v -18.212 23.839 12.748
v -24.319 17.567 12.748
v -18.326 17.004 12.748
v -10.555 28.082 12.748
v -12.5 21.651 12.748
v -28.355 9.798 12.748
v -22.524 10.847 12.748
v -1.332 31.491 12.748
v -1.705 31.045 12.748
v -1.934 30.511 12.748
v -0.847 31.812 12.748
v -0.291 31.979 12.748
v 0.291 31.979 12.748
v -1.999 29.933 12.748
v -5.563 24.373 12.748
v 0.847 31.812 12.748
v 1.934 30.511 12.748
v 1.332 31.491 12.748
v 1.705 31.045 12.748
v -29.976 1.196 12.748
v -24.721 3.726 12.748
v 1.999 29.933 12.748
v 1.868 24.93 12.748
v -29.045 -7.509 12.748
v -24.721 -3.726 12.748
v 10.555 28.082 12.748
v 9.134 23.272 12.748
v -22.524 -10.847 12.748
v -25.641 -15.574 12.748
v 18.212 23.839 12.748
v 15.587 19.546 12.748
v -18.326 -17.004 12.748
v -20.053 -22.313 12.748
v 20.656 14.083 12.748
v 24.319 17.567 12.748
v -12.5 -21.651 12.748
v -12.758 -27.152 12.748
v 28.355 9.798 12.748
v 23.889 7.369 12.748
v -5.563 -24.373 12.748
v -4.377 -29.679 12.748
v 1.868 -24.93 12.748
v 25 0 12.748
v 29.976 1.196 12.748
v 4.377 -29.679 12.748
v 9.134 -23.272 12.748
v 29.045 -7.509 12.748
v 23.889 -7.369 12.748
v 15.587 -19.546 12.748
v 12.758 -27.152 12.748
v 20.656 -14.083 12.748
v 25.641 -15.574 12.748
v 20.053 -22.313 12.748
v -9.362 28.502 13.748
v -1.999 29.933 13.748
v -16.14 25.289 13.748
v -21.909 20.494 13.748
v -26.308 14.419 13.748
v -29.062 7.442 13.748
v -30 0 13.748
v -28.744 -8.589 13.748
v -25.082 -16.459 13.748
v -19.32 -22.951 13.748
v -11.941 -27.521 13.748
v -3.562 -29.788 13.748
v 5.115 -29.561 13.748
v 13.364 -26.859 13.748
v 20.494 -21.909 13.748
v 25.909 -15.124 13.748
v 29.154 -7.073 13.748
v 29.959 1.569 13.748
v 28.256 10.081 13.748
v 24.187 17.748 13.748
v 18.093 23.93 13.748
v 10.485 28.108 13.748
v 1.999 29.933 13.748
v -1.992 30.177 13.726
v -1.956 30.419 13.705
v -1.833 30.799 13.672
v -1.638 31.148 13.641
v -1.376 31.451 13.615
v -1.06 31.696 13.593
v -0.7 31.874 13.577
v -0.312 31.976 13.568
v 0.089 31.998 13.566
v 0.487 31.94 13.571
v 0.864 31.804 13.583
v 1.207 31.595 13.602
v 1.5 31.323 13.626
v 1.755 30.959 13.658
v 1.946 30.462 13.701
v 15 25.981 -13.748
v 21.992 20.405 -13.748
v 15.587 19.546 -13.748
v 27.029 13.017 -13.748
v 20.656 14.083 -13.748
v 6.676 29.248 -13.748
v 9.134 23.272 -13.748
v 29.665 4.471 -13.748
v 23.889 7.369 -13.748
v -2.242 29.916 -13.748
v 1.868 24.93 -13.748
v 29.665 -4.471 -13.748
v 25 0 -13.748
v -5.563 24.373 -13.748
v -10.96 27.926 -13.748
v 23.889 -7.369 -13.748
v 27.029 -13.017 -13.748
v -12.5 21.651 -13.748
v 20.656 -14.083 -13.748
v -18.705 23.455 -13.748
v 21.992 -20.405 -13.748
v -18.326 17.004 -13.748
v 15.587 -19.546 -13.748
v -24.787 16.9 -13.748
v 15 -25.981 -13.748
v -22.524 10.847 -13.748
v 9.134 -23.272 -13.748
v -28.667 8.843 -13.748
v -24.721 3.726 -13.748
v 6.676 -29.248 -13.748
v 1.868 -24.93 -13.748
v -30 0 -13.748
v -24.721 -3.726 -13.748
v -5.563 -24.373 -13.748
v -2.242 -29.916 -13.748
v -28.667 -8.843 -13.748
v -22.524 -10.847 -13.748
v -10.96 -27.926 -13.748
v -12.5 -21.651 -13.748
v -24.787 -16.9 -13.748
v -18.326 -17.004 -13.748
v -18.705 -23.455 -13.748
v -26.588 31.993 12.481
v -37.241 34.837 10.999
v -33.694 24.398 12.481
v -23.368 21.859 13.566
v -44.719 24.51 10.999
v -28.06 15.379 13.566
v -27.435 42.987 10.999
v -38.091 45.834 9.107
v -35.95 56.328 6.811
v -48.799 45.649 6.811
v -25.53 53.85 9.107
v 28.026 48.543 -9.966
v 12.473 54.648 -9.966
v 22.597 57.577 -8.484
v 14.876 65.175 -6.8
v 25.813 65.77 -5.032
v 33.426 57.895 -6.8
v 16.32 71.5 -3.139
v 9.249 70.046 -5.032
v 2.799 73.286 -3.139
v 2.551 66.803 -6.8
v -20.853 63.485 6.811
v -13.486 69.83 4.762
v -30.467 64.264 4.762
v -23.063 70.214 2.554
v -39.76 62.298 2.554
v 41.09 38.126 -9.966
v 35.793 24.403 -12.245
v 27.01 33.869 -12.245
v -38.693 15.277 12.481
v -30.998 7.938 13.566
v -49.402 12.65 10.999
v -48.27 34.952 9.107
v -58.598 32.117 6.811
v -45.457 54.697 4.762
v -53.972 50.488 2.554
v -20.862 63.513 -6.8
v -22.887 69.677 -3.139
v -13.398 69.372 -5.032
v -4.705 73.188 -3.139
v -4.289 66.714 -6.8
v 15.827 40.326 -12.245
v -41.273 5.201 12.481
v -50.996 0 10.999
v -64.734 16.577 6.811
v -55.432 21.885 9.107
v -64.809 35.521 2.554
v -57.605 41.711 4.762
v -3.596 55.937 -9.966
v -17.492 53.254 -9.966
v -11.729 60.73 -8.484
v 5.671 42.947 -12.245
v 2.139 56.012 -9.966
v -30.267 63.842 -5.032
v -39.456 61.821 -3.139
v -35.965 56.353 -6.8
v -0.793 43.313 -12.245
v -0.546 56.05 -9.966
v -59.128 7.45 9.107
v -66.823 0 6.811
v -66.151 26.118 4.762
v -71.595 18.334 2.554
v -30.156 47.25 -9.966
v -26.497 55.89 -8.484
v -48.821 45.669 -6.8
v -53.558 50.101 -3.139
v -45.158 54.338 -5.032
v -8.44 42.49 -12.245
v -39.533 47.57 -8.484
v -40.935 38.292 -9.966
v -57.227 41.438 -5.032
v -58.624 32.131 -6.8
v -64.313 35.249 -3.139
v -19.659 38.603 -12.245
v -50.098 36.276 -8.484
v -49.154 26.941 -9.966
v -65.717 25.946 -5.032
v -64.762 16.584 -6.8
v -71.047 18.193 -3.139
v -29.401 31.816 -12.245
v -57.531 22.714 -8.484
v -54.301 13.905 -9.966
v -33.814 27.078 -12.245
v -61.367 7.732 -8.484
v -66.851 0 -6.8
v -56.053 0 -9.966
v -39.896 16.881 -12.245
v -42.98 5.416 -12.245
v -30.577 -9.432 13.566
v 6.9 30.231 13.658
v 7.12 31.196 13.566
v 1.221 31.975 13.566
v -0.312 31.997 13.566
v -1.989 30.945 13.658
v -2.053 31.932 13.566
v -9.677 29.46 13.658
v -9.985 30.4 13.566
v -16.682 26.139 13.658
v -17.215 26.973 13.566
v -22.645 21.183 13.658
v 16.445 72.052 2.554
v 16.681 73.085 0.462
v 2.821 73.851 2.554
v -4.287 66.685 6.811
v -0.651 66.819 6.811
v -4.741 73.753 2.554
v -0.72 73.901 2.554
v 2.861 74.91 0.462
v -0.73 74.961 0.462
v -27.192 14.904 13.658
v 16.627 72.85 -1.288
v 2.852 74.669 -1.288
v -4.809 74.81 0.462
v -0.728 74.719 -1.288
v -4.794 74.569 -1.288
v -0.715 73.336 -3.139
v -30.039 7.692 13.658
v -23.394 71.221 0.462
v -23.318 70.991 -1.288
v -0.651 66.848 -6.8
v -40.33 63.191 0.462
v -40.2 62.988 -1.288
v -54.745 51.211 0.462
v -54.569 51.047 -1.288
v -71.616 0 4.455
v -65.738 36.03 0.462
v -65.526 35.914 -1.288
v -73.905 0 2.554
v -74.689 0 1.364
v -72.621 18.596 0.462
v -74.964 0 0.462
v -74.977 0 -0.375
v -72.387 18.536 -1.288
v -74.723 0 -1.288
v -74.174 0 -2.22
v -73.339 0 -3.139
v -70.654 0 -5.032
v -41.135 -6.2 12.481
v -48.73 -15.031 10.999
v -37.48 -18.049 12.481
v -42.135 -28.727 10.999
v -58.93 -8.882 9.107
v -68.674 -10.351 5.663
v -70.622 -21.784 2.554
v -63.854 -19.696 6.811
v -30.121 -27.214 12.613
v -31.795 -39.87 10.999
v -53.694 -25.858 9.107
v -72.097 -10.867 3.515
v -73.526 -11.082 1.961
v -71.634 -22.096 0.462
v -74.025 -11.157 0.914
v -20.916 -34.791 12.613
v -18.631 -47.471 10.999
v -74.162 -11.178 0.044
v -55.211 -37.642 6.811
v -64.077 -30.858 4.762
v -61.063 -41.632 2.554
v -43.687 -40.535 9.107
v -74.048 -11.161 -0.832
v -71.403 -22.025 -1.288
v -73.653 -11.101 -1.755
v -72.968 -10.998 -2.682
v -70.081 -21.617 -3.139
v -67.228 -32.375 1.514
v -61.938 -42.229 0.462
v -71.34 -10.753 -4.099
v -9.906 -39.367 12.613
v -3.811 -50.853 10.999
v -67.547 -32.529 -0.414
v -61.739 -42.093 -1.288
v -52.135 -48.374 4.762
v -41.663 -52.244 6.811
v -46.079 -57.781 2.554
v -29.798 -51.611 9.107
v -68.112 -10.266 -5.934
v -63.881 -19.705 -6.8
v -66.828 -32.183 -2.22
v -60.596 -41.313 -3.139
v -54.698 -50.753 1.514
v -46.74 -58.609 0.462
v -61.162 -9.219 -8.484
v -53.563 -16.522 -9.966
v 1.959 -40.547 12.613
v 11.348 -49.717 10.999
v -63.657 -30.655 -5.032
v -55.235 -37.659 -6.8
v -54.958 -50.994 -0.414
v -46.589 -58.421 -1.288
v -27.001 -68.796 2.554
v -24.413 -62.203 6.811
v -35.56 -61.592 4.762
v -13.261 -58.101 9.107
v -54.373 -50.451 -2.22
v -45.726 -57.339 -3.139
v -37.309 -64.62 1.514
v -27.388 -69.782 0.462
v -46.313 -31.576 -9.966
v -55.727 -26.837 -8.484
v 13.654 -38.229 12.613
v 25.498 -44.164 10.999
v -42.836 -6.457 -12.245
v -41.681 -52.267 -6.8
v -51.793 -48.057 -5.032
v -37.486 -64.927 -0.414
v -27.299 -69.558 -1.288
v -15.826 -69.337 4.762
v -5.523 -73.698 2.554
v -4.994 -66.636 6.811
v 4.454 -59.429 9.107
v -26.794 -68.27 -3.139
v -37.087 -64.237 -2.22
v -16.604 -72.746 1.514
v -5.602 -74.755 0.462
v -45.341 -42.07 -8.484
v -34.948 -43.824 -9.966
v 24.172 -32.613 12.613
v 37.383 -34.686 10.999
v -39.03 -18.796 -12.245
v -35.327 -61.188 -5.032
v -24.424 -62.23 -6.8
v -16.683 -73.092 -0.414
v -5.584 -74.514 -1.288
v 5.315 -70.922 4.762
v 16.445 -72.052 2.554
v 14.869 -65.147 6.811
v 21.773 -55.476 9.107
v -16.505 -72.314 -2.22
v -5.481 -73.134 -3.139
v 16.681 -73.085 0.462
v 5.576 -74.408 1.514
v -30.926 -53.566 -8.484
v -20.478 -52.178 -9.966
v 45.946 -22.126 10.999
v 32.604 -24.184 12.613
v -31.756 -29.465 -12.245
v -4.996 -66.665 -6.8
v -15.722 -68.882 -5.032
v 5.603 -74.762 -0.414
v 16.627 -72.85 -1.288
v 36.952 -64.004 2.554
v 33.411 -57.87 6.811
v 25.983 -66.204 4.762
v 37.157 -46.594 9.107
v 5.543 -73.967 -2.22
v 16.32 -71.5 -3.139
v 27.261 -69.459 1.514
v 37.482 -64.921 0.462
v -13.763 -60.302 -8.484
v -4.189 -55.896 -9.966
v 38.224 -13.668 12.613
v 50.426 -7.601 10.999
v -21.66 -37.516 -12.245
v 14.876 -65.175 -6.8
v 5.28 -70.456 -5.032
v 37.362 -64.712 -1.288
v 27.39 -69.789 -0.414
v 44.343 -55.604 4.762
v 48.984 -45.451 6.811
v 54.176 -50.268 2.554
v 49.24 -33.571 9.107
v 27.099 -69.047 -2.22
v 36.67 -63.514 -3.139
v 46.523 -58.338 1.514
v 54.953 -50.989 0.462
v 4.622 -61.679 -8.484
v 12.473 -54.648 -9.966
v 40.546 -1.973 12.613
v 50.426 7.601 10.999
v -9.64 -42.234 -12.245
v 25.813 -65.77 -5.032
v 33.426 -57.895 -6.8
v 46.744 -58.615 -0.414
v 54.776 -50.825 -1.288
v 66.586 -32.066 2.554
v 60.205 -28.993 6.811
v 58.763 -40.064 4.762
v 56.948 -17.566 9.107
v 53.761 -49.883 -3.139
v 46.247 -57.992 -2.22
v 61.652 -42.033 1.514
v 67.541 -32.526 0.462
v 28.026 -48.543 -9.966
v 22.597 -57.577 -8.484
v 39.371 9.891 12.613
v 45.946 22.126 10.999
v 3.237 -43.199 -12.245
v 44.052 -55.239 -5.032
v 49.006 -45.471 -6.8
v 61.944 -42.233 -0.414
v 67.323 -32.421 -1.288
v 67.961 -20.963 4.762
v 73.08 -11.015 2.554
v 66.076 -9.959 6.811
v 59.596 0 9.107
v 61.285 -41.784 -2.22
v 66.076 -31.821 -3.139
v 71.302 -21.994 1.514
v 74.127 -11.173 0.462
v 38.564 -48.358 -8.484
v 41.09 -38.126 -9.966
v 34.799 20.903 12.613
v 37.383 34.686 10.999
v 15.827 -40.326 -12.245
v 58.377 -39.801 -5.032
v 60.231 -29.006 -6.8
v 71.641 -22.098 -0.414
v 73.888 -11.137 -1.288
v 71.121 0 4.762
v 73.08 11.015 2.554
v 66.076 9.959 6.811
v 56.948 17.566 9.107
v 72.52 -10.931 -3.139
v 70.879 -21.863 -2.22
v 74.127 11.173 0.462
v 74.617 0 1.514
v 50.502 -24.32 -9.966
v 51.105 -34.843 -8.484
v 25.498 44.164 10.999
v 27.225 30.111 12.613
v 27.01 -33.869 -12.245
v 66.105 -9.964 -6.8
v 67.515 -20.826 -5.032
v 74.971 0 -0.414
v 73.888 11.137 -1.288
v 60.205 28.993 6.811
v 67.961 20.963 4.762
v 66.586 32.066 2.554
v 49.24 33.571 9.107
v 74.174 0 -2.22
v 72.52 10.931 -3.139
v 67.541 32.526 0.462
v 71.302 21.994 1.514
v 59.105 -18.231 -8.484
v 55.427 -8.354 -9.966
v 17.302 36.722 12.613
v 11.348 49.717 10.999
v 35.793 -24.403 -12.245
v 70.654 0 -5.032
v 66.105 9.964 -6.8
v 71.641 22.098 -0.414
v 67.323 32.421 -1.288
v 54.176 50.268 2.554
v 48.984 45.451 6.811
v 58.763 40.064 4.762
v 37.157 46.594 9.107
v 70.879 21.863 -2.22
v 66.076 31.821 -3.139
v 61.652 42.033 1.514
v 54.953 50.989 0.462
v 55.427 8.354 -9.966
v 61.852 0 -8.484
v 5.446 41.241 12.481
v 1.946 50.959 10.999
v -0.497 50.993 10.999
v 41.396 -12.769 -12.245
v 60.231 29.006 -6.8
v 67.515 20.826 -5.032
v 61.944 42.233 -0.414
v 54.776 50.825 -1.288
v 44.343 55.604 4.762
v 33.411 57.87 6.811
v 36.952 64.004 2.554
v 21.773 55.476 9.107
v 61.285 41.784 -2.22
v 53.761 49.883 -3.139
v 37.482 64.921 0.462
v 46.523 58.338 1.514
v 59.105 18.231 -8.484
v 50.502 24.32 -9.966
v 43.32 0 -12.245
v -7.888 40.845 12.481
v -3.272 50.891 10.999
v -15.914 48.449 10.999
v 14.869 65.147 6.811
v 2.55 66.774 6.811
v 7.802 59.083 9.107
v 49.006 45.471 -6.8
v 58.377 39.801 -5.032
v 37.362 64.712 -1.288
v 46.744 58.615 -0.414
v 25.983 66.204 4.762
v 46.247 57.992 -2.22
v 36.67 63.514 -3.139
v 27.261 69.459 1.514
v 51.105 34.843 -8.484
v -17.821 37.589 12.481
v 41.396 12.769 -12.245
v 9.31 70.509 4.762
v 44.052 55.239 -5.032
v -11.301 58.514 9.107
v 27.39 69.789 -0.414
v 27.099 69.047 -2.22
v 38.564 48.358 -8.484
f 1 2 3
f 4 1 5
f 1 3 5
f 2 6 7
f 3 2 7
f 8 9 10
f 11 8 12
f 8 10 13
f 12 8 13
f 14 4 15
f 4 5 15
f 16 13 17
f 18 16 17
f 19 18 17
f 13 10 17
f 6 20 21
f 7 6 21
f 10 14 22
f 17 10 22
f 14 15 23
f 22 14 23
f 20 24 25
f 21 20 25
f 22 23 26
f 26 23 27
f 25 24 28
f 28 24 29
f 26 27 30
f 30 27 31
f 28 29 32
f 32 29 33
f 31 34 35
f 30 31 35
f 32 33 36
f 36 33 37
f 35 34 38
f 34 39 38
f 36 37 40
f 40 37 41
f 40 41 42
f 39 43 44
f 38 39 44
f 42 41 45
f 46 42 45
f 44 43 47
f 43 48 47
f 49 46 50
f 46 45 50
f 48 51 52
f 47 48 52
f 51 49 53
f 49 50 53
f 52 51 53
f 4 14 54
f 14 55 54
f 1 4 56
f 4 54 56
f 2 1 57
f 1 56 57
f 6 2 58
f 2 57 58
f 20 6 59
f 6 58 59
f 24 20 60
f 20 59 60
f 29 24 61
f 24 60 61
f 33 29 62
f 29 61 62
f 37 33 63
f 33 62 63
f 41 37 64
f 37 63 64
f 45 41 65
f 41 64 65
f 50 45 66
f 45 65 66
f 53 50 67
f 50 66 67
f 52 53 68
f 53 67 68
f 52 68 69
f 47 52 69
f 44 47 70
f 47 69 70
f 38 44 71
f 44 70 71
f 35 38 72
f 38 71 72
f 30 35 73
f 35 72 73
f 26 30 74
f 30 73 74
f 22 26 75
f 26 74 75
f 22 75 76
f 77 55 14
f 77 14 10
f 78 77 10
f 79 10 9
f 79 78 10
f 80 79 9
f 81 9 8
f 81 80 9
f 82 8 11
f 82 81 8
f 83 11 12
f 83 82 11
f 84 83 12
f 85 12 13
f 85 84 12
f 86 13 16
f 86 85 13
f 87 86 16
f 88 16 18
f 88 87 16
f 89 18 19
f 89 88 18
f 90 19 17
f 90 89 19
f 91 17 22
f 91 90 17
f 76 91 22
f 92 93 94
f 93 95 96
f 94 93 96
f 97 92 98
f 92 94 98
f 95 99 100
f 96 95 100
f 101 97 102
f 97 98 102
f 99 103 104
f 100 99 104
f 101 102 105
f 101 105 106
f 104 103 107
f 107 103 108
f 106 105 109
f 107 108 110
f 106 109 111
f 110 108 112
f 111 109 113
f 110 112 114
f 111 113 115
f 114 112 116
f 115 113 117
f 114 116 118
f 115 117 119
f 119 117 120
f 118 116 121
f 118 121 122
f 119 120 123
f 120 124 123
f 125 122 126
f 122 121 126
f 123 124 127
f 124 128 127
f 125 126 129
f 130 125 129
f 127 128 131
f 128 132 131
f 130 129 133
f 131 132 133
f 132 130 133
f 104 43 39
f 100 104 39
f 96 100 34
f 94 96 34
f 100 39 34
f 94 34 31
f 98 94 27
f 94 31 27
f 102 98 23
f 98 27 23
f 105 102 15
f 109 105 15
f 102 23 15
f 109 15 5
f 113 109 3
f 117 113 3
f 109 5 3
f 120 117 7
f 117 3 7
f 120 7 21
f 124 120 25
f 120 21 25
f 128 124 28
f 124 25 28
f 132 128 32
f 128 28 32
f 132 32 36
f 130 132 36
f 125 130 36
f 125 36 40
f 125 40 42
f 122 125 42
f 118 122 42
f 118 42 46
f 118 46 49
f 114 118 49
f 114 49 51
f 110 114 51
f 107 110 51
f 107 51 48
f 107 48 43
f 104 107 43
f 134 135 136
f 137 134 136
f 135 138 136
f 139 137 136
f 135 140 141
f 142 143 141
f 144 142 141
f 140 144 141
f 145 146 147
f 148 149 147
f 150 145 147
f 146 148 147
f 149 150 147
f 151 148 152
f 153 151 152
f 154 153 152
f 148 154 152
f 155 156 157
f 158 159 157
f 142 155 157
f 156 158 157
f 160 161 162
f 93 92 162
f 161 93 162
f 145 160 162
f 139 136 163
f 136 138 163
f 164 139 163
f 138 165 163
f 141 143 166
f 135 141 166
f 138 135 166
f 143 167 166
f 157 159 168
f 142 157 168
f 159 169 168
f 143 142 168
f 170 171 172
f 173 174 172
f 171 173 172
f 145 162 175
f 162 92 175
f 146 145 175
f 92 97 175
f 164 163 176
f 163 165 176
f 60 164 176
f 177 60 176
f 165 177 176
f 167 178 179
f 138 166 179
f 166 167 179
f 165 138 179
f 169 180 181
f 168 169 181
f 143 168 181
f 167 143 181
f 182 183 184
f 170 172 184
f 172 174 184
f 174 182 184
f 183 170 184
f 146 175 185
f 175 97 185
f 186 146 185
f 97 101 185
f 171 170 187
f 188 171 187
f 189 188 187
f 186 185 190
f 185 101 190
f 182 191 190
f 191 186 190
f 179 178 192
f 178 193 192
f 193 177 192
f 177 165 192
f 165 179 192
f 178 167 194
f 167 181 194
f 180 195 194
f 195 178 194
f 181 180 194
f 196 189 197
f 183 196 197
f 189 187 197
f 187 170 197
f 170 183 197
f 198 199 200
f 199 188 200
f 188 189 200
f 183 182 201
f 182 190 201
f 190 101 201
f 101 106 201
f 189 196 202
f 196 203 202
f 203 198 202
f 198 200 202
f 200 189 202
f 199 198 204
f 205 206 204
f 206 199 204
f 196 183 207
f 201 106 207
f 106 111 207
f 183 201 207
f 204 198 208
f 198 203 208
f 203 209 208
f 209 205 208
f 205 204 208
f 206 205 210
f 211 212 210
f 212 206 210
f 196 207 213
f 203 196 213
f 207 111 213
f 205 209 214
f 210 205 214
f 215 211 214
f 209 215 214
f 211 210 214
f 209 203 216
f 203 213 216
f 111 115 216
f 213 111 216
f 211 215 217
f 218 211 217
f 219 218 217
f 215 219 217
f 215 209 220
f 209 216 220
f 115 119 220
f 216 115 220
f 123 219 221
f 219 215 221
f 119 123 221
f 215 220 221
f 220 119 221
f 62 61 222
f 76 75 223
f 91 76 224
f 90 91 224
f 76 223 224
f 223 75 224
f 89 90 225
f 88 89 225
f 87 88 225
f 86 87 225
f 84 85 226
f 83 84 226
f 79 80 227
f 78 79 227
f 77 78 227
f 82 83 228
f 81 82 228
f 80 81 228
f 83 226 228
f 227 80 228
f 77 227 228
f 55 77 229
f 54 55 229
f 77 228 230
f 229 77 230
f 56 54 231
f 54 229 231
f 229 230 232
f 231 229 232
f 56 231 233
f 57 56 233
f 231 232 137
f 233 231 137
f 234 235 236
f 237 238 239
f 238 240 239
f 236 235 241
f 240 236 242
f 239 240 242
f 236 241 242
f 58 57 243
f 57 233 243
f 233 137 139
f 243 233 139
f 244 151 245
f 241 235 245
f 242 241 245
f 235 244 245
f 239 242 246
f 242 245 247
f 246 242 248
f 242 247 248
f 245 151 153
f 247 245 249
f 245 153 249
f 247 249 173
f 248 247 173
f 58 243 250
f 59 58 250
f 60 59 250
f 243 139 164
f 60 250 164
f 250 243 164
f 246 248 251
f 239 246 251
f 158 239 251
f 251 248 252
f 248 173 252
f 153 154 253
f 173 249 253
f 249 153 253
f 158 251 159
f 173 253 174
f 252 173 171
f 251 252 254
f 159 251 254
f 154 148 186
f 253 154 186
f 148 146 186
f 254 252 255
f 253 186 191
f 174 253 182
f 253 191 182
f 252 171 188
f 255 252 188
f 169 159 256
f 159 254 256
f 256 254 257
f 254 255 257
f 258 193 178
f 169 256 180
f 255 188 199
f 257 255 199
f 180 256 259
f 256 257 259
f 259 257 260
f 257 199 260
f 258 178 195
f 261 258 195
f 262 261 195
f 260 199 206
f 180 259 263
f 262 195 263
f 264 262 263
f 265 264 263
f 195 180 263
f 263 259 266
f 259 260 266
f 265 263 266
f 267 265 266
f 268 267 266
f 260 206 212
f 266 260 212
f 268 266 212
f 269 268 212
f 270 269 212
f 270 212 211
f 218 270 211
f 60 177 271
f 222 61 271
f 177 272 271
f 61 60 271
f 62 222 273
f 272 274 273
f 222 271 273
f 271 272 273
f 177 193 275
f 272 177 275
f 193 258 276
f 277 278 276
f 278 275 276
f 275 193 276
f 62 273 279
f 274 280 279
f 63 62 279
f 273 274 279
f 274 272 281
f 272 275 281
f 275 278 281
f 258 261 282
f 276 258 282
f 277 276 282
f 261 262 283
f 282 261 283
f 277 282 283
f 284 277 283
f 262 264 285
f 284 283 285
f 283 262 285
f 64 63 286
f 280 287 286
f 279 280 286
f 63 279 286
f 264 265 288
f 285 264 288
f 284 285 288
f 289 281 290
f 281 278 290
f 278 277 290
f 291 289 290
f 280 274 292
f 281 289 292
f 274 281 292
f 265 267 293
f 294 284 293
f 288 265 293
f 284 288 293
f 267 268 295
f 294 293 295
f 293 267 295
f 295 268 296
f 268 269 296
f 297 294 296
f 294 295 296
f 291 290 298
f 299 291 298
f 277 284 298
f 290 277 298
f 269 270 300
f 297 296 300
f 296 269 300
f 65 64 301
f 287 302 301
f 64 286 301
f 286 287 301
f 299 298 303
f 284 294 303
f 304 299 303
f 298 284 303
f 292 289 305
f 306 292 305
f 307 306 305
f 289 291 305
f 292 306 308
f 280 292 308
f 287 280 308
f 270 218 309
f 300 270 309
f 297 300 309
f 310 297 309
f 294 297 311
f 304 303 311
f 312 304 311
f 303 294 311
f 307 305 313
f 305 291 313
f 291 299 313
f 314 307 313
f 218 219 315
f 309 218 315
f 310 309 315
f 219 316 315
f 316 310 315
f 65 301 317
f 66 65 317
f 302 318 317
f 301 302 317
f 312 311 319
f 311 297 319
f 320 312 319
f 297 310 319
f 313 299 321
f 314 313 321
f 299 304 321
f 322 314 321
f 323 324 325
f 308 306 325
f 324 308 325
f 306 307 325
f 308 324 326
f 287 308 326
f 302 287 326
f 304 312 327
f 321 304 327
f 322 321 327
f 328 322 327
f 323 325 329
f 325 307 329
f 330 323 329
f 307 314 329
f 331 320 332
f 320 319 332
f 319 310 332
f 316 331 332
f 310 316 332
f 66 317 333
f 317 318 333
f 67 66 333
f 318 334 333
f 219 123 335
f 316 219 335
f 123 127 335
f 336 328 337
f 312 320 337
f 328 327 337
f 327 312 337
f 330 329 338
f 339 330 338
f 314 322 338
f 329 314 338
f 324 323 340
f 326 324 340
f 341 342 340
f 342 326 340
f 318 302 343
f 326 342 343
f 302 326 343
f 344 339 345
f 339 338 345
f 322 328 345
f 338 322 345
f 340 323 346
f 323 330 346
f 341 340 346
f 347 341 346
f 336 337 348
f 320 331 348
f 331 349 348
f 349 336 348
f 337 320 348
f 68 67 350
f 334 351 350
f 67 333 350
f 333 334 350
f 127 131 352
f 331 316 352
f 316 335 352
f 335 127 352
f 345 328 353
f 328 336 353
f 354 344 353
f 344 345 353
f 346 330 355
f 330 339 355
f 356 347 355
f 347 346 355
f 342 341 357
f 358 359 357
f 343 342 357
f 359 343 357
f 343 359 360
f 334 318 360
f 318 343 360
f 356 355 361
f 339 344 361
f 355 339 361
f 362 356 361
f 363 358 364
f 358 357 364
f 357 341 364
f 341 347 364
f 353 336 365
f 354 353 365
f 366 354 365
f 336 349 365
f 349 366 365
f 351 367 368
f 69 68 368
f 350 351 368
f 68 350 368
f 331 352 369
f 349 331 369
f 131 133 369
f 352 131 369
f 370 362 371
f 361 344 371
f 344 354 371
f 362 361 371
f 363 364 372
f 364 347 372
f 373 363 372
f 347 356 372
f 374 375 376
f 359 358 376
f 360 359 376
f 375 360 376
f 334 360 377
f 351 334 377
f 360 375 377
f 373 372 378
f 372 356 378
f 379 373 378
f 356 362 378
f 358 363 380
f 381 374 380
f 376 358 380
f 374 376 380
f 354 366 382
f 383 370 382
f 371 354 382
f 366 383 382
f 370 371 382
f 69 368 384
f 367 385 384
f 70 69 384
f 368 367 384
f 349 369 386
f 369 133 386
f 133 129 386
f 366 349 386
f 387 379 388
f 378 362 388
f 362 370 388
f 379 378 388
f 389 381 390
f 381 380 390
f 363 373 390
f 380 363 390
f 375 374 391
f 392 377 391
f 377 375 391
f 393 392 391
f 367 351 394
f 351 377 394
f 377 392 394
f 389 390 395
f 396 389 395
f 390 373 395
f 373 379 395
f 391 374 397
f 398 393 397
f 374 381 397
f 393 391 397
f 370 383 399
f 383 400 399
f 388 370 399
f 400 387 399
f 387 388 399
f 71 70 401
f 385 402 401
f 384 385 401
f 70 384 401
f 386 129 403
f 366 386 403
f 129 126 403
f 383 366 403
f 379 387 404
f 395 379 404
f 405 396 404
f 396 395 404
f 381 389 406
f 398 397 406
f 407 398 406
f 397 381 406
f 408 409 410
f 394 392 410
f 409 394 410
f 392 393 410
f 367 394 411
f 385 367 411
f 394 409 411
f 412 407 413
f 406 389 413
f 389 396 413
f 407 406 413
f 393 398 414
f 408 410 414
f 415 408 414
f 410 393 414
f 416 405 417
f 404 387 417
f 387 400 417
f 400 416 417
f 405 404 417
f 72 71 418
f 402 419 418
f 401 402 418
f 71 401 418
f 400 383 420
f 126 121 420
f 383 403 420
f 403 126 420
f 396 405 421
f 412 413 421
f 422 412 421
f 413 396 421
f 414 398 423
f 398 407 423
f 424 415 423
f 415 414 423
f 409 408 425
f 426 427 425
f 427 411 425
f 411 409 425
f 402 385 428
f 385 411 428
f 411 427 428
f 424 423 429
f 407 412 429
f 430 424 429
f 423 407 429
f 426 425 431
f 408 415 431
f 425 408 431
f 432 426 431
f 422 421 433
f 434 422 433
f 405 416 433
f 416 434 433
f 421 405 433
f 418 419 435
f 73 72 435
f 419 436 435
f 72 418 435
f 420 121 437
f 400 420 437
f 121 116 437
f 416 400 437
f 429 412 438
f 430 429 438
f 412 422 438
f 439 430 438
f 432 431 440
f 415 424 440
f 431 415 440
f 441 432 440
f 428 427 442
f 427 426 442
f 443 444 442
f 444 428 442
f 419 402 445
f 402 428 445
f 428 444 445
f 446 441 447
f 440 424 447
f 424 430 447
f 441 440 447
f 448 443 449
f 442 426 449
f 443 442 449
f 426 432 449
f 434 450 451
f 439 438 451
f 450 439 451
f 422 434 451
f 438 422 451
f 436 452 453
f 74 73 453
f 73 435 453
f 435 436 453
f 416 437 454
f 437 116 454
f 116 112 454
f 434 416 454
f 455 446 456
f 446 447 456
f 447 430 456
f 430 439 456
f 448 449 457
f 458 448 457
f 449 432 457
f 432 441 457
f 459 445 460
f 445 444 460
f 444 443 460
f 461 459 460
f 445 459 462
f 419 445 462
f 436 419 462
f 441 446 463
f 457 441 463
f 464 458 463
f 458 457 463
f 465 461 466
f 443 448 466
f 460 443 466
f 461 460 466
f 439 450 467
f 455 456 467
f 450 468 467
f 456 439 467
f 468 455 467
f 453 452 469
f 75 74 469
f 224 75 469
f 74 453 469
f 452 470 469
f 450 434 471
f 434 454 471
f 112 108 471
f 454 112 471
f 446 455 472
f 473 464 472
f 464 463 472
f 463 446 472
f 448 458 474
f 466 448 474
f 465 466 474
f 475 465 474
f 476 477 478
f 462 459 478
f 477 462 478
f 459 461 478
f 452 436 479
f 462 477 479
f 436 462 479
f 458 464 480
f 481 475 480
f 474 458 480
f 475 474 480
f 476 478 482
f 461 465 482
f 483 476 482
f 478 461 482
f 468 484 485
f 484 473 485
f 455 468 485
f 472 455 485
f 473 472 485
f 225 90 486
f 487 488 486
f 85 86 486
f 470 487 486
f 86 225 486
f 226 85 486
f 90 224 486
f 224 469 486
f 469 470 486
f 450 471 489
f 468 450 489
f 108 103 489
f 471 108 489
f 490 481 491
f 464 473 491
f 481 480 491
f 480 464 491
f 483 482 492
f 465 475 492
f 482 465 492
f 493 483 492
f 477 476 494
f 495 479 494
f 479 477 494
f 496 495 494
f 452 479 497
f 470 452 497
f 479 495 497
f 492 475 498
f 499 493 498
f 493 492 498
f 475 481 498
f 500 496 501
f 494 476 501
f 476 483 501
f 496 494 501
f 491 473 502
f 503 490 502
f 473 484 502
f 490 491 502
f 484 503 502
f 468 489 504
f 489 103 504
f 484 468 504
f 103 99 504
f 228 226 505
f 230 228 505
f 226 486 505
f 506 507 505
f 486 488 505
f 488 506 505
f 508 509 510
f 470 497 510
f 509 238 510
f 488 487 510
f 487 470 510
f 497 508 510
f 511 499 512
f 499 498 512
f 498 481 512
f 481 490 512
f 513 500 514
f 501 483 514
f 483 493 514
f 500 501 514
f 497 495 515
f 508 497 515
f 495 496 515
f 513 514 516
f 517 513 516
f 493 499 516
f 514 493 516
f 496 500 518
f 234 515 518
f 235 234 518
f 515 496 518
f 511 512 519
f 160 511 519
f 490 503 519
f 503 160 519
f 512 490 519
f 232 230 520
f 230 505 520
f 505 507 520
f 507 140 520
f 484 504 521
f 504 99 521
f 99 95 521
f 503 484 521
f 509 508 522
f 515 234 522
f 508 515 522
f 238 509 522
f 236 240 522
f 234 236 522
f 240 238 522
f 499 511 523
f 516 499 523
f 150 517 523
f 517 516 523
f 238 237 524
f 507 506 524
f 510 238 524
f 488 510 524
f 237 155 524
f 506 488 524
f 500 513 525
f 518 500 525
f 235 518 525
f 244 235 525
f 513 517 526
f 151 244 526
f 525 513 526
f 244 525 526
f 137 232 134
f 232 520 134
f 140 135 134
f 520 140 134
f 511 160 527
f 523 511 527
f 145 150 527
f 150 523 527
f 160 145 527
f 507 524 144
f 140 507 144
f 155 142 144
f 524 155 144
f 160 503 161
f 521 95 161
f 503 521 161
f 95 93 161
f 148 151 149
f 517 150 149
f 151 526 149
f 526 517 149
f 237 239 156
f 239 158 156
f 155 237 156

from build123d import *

# Parameters (mm, degrees)
F2_R     = 25
F4_DEPTH = 27.4954541697
F5_DEPTH = 1
F7_DEPTH = 1


with BuildPart() as f1:
    # F0 (on Front) → F1 (revolve)
    with BuildSketch(Plane.XZ):
        with BuildLine():
            Line((0, 13.7477270849), (-30, 13.7477270849))
            add(Edge.make_bspline(
                [(-30, 13.7477270849), (-187.5, 0), (-30, -13.7477270849)],
                knots=[1.9823131729, 1.9823131729, 1.9823131729, 4.3008721343, 4.3008721343, 4.3008721343], degree=2, weights=[1, 0.4, 1]))
            Line((-30, -13.7477270849), (0, -13.7477270849))
            Line((0, -13.7477270849), (0, 13.7477270849))
        make_face()
    revolve(axis=Axis((0, 0, 0), (0, 0, 1)))

    # F2 (on face) → F4 (cut, through all)
    with BuildSketch(Plane.XY.offset(13.7477270849)):
        Circle(F2_R)
    extrude(amount=-F4_DEPTH, mode=Mode.SUBTRACT)

    # F5 (cut): a face of the model
    f5_faces = [f1.faces().sort_by_distance(p)[0] for p in [
        (29.1514718626, 0, 13.7477270849),
    ]]
    extrude(f5_faces, amount=-F5_DEPTH, mode=Mode.SUBTRACT)

    # F6 (on 3pt) → F7 (cut)
    with BuildSketch(Plane(origin=(0, 0, 13.7477270849), x_dir=(1, 0, 0), z_dir=(0, 0, -1))):
        with BuildLine():
            ThreePointArc((1.9988885801, -29.9333333333), (0, -30), (-1.9988885801, -29.9333333333))
            ThreePointArc((-1.9988885801, -29.9333333333), (0, -32), (1.9988885801, -29.9333333333))
        make_face()
    extrude(amount=F7_DEPTH, mode=Mode.SUBTRACT)


solid = f1.part
